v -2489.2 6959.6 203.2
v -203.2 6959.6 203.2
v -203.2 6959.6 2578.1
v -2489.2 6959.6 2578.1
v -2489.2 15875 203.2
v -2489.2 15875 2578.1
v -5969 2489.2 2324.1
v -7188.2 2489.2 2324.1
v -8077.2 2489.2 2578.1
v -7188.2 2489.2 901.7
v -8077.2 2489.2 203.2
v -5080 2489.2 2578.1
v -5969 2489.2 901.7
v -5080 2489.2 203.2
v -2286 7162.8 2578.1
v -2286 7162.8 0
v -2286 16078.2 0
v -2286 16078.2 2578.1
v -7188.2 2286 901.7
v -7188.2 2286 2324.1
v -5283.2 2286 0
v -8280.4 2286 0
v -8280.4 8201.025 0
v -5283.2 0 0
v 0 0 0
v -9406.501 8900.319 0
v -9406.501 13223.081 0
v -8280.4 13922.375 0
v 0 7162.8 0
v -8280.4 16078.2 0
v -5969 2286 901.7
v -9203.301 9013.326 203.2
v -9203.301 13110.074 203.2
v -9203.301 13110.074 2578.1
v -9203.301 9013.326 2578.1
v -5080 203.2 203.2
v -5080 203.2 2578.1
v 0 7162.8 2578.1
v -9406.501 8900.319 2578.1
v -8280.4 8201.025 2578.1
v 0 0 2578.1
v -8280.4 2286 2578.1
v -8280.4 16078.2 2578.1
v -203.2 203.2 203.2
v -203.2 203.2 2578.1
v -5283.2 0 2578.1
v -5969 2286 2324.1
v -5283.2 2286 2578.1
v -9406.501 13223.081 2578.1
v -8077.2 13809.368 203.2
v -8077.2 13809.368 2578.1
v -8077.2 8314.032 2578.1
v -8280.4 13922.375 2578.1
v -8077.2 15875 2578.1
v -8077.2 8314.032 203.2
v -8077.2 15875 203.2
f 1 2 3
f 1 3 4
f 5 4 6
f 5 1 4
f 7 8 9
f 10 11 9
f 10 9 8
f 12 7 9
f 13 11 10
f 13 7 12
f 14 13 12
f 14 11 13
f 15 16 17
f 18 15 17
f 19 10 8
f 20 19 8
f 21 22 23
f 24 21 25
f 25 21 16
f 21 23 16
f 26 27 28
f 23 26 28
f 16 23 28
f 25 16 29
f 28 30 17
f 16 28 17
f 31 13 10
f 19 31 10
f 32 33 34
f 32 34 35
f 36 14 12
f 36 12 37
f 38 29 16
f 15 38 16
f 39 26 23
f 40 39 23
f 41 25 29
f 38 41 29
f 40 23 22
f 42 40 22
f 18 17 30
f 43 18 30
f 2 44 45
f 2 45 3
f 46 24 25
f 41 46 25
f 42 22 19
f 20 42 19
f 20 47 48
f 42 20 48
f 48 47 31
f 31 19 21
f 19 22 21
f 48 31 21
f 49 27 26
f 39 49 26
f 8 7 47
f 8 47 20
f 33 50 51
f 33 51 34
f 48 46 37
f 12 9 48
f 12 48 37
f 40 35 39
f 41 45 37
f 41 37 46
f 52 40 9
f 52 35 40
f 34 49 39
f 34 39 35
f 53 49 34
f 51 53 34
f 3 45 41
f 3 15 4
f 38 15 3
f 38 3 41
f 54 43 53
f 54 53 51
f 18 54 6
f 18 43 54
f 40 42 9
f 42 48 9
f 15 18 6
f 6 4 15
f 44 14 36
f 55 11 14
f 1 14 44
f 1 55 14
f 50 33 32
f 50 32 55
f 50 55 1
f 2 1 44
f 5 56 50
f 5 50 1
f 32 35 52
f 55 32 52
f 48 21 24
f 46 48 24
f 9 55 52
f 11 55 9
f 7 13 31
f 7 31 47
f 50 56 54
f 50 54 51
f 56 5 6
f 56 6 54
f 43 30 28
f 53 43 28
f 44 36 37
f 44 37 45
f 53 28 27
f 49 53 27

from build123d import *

# Parameters (mm, degrees)
F1_DEPTH = 2578.1
F2_T     = -203.2
F3_W     = 1219.2
F3_H     = 1422.4
F5_DEPTH = 203.2


# Not quite as in the source:
# - a feature of the source that left no trace in its solid (it failed there, or was rolled back) is left out


with BuildPart() as f1:
    # F0 (on Top) → F1 (new body)
    with BuildSketch(Plane.XY):
        Polygon((-2286, 16078.2), (-8280.4, 16078.2), (-8280.4, 13922.375), (-9406.501324312, 13223.08125), (-9406.501324312, 8900.31875), (-8280.4, 8201.025), (-8280.4, 2286), (-5283.2, 2286), (-5283.2, 0), (0, 0), (0, 7162.8), (-2286, 7162.8), align=None)
    extrude(amount=F1_DEPTH)

    # F2
    f2_openings = [f1.faces().sort_by_distance(p)[0] for p in [
        (-4762.628229, 7961.579676, 2578.1),
    ]]
    offset(amount=F2_T, openings=f2_openings, kind=Kind.INTERSECTION)

    # F3 (on face) → F5 (cut, through all)
    with BuildSketch(Plane(origin=(0, 2489.2, 0), x_dir=(-1, 0, 0), z_dir=(0, 1, 0))):
        with Locations((6578.6, 1612.9)):
            Rectangle(F3_W, F3_H)
    extrude(amount=-F5_DEPTH, mode=Mode.SUBTRACT)


solid = f1.part
